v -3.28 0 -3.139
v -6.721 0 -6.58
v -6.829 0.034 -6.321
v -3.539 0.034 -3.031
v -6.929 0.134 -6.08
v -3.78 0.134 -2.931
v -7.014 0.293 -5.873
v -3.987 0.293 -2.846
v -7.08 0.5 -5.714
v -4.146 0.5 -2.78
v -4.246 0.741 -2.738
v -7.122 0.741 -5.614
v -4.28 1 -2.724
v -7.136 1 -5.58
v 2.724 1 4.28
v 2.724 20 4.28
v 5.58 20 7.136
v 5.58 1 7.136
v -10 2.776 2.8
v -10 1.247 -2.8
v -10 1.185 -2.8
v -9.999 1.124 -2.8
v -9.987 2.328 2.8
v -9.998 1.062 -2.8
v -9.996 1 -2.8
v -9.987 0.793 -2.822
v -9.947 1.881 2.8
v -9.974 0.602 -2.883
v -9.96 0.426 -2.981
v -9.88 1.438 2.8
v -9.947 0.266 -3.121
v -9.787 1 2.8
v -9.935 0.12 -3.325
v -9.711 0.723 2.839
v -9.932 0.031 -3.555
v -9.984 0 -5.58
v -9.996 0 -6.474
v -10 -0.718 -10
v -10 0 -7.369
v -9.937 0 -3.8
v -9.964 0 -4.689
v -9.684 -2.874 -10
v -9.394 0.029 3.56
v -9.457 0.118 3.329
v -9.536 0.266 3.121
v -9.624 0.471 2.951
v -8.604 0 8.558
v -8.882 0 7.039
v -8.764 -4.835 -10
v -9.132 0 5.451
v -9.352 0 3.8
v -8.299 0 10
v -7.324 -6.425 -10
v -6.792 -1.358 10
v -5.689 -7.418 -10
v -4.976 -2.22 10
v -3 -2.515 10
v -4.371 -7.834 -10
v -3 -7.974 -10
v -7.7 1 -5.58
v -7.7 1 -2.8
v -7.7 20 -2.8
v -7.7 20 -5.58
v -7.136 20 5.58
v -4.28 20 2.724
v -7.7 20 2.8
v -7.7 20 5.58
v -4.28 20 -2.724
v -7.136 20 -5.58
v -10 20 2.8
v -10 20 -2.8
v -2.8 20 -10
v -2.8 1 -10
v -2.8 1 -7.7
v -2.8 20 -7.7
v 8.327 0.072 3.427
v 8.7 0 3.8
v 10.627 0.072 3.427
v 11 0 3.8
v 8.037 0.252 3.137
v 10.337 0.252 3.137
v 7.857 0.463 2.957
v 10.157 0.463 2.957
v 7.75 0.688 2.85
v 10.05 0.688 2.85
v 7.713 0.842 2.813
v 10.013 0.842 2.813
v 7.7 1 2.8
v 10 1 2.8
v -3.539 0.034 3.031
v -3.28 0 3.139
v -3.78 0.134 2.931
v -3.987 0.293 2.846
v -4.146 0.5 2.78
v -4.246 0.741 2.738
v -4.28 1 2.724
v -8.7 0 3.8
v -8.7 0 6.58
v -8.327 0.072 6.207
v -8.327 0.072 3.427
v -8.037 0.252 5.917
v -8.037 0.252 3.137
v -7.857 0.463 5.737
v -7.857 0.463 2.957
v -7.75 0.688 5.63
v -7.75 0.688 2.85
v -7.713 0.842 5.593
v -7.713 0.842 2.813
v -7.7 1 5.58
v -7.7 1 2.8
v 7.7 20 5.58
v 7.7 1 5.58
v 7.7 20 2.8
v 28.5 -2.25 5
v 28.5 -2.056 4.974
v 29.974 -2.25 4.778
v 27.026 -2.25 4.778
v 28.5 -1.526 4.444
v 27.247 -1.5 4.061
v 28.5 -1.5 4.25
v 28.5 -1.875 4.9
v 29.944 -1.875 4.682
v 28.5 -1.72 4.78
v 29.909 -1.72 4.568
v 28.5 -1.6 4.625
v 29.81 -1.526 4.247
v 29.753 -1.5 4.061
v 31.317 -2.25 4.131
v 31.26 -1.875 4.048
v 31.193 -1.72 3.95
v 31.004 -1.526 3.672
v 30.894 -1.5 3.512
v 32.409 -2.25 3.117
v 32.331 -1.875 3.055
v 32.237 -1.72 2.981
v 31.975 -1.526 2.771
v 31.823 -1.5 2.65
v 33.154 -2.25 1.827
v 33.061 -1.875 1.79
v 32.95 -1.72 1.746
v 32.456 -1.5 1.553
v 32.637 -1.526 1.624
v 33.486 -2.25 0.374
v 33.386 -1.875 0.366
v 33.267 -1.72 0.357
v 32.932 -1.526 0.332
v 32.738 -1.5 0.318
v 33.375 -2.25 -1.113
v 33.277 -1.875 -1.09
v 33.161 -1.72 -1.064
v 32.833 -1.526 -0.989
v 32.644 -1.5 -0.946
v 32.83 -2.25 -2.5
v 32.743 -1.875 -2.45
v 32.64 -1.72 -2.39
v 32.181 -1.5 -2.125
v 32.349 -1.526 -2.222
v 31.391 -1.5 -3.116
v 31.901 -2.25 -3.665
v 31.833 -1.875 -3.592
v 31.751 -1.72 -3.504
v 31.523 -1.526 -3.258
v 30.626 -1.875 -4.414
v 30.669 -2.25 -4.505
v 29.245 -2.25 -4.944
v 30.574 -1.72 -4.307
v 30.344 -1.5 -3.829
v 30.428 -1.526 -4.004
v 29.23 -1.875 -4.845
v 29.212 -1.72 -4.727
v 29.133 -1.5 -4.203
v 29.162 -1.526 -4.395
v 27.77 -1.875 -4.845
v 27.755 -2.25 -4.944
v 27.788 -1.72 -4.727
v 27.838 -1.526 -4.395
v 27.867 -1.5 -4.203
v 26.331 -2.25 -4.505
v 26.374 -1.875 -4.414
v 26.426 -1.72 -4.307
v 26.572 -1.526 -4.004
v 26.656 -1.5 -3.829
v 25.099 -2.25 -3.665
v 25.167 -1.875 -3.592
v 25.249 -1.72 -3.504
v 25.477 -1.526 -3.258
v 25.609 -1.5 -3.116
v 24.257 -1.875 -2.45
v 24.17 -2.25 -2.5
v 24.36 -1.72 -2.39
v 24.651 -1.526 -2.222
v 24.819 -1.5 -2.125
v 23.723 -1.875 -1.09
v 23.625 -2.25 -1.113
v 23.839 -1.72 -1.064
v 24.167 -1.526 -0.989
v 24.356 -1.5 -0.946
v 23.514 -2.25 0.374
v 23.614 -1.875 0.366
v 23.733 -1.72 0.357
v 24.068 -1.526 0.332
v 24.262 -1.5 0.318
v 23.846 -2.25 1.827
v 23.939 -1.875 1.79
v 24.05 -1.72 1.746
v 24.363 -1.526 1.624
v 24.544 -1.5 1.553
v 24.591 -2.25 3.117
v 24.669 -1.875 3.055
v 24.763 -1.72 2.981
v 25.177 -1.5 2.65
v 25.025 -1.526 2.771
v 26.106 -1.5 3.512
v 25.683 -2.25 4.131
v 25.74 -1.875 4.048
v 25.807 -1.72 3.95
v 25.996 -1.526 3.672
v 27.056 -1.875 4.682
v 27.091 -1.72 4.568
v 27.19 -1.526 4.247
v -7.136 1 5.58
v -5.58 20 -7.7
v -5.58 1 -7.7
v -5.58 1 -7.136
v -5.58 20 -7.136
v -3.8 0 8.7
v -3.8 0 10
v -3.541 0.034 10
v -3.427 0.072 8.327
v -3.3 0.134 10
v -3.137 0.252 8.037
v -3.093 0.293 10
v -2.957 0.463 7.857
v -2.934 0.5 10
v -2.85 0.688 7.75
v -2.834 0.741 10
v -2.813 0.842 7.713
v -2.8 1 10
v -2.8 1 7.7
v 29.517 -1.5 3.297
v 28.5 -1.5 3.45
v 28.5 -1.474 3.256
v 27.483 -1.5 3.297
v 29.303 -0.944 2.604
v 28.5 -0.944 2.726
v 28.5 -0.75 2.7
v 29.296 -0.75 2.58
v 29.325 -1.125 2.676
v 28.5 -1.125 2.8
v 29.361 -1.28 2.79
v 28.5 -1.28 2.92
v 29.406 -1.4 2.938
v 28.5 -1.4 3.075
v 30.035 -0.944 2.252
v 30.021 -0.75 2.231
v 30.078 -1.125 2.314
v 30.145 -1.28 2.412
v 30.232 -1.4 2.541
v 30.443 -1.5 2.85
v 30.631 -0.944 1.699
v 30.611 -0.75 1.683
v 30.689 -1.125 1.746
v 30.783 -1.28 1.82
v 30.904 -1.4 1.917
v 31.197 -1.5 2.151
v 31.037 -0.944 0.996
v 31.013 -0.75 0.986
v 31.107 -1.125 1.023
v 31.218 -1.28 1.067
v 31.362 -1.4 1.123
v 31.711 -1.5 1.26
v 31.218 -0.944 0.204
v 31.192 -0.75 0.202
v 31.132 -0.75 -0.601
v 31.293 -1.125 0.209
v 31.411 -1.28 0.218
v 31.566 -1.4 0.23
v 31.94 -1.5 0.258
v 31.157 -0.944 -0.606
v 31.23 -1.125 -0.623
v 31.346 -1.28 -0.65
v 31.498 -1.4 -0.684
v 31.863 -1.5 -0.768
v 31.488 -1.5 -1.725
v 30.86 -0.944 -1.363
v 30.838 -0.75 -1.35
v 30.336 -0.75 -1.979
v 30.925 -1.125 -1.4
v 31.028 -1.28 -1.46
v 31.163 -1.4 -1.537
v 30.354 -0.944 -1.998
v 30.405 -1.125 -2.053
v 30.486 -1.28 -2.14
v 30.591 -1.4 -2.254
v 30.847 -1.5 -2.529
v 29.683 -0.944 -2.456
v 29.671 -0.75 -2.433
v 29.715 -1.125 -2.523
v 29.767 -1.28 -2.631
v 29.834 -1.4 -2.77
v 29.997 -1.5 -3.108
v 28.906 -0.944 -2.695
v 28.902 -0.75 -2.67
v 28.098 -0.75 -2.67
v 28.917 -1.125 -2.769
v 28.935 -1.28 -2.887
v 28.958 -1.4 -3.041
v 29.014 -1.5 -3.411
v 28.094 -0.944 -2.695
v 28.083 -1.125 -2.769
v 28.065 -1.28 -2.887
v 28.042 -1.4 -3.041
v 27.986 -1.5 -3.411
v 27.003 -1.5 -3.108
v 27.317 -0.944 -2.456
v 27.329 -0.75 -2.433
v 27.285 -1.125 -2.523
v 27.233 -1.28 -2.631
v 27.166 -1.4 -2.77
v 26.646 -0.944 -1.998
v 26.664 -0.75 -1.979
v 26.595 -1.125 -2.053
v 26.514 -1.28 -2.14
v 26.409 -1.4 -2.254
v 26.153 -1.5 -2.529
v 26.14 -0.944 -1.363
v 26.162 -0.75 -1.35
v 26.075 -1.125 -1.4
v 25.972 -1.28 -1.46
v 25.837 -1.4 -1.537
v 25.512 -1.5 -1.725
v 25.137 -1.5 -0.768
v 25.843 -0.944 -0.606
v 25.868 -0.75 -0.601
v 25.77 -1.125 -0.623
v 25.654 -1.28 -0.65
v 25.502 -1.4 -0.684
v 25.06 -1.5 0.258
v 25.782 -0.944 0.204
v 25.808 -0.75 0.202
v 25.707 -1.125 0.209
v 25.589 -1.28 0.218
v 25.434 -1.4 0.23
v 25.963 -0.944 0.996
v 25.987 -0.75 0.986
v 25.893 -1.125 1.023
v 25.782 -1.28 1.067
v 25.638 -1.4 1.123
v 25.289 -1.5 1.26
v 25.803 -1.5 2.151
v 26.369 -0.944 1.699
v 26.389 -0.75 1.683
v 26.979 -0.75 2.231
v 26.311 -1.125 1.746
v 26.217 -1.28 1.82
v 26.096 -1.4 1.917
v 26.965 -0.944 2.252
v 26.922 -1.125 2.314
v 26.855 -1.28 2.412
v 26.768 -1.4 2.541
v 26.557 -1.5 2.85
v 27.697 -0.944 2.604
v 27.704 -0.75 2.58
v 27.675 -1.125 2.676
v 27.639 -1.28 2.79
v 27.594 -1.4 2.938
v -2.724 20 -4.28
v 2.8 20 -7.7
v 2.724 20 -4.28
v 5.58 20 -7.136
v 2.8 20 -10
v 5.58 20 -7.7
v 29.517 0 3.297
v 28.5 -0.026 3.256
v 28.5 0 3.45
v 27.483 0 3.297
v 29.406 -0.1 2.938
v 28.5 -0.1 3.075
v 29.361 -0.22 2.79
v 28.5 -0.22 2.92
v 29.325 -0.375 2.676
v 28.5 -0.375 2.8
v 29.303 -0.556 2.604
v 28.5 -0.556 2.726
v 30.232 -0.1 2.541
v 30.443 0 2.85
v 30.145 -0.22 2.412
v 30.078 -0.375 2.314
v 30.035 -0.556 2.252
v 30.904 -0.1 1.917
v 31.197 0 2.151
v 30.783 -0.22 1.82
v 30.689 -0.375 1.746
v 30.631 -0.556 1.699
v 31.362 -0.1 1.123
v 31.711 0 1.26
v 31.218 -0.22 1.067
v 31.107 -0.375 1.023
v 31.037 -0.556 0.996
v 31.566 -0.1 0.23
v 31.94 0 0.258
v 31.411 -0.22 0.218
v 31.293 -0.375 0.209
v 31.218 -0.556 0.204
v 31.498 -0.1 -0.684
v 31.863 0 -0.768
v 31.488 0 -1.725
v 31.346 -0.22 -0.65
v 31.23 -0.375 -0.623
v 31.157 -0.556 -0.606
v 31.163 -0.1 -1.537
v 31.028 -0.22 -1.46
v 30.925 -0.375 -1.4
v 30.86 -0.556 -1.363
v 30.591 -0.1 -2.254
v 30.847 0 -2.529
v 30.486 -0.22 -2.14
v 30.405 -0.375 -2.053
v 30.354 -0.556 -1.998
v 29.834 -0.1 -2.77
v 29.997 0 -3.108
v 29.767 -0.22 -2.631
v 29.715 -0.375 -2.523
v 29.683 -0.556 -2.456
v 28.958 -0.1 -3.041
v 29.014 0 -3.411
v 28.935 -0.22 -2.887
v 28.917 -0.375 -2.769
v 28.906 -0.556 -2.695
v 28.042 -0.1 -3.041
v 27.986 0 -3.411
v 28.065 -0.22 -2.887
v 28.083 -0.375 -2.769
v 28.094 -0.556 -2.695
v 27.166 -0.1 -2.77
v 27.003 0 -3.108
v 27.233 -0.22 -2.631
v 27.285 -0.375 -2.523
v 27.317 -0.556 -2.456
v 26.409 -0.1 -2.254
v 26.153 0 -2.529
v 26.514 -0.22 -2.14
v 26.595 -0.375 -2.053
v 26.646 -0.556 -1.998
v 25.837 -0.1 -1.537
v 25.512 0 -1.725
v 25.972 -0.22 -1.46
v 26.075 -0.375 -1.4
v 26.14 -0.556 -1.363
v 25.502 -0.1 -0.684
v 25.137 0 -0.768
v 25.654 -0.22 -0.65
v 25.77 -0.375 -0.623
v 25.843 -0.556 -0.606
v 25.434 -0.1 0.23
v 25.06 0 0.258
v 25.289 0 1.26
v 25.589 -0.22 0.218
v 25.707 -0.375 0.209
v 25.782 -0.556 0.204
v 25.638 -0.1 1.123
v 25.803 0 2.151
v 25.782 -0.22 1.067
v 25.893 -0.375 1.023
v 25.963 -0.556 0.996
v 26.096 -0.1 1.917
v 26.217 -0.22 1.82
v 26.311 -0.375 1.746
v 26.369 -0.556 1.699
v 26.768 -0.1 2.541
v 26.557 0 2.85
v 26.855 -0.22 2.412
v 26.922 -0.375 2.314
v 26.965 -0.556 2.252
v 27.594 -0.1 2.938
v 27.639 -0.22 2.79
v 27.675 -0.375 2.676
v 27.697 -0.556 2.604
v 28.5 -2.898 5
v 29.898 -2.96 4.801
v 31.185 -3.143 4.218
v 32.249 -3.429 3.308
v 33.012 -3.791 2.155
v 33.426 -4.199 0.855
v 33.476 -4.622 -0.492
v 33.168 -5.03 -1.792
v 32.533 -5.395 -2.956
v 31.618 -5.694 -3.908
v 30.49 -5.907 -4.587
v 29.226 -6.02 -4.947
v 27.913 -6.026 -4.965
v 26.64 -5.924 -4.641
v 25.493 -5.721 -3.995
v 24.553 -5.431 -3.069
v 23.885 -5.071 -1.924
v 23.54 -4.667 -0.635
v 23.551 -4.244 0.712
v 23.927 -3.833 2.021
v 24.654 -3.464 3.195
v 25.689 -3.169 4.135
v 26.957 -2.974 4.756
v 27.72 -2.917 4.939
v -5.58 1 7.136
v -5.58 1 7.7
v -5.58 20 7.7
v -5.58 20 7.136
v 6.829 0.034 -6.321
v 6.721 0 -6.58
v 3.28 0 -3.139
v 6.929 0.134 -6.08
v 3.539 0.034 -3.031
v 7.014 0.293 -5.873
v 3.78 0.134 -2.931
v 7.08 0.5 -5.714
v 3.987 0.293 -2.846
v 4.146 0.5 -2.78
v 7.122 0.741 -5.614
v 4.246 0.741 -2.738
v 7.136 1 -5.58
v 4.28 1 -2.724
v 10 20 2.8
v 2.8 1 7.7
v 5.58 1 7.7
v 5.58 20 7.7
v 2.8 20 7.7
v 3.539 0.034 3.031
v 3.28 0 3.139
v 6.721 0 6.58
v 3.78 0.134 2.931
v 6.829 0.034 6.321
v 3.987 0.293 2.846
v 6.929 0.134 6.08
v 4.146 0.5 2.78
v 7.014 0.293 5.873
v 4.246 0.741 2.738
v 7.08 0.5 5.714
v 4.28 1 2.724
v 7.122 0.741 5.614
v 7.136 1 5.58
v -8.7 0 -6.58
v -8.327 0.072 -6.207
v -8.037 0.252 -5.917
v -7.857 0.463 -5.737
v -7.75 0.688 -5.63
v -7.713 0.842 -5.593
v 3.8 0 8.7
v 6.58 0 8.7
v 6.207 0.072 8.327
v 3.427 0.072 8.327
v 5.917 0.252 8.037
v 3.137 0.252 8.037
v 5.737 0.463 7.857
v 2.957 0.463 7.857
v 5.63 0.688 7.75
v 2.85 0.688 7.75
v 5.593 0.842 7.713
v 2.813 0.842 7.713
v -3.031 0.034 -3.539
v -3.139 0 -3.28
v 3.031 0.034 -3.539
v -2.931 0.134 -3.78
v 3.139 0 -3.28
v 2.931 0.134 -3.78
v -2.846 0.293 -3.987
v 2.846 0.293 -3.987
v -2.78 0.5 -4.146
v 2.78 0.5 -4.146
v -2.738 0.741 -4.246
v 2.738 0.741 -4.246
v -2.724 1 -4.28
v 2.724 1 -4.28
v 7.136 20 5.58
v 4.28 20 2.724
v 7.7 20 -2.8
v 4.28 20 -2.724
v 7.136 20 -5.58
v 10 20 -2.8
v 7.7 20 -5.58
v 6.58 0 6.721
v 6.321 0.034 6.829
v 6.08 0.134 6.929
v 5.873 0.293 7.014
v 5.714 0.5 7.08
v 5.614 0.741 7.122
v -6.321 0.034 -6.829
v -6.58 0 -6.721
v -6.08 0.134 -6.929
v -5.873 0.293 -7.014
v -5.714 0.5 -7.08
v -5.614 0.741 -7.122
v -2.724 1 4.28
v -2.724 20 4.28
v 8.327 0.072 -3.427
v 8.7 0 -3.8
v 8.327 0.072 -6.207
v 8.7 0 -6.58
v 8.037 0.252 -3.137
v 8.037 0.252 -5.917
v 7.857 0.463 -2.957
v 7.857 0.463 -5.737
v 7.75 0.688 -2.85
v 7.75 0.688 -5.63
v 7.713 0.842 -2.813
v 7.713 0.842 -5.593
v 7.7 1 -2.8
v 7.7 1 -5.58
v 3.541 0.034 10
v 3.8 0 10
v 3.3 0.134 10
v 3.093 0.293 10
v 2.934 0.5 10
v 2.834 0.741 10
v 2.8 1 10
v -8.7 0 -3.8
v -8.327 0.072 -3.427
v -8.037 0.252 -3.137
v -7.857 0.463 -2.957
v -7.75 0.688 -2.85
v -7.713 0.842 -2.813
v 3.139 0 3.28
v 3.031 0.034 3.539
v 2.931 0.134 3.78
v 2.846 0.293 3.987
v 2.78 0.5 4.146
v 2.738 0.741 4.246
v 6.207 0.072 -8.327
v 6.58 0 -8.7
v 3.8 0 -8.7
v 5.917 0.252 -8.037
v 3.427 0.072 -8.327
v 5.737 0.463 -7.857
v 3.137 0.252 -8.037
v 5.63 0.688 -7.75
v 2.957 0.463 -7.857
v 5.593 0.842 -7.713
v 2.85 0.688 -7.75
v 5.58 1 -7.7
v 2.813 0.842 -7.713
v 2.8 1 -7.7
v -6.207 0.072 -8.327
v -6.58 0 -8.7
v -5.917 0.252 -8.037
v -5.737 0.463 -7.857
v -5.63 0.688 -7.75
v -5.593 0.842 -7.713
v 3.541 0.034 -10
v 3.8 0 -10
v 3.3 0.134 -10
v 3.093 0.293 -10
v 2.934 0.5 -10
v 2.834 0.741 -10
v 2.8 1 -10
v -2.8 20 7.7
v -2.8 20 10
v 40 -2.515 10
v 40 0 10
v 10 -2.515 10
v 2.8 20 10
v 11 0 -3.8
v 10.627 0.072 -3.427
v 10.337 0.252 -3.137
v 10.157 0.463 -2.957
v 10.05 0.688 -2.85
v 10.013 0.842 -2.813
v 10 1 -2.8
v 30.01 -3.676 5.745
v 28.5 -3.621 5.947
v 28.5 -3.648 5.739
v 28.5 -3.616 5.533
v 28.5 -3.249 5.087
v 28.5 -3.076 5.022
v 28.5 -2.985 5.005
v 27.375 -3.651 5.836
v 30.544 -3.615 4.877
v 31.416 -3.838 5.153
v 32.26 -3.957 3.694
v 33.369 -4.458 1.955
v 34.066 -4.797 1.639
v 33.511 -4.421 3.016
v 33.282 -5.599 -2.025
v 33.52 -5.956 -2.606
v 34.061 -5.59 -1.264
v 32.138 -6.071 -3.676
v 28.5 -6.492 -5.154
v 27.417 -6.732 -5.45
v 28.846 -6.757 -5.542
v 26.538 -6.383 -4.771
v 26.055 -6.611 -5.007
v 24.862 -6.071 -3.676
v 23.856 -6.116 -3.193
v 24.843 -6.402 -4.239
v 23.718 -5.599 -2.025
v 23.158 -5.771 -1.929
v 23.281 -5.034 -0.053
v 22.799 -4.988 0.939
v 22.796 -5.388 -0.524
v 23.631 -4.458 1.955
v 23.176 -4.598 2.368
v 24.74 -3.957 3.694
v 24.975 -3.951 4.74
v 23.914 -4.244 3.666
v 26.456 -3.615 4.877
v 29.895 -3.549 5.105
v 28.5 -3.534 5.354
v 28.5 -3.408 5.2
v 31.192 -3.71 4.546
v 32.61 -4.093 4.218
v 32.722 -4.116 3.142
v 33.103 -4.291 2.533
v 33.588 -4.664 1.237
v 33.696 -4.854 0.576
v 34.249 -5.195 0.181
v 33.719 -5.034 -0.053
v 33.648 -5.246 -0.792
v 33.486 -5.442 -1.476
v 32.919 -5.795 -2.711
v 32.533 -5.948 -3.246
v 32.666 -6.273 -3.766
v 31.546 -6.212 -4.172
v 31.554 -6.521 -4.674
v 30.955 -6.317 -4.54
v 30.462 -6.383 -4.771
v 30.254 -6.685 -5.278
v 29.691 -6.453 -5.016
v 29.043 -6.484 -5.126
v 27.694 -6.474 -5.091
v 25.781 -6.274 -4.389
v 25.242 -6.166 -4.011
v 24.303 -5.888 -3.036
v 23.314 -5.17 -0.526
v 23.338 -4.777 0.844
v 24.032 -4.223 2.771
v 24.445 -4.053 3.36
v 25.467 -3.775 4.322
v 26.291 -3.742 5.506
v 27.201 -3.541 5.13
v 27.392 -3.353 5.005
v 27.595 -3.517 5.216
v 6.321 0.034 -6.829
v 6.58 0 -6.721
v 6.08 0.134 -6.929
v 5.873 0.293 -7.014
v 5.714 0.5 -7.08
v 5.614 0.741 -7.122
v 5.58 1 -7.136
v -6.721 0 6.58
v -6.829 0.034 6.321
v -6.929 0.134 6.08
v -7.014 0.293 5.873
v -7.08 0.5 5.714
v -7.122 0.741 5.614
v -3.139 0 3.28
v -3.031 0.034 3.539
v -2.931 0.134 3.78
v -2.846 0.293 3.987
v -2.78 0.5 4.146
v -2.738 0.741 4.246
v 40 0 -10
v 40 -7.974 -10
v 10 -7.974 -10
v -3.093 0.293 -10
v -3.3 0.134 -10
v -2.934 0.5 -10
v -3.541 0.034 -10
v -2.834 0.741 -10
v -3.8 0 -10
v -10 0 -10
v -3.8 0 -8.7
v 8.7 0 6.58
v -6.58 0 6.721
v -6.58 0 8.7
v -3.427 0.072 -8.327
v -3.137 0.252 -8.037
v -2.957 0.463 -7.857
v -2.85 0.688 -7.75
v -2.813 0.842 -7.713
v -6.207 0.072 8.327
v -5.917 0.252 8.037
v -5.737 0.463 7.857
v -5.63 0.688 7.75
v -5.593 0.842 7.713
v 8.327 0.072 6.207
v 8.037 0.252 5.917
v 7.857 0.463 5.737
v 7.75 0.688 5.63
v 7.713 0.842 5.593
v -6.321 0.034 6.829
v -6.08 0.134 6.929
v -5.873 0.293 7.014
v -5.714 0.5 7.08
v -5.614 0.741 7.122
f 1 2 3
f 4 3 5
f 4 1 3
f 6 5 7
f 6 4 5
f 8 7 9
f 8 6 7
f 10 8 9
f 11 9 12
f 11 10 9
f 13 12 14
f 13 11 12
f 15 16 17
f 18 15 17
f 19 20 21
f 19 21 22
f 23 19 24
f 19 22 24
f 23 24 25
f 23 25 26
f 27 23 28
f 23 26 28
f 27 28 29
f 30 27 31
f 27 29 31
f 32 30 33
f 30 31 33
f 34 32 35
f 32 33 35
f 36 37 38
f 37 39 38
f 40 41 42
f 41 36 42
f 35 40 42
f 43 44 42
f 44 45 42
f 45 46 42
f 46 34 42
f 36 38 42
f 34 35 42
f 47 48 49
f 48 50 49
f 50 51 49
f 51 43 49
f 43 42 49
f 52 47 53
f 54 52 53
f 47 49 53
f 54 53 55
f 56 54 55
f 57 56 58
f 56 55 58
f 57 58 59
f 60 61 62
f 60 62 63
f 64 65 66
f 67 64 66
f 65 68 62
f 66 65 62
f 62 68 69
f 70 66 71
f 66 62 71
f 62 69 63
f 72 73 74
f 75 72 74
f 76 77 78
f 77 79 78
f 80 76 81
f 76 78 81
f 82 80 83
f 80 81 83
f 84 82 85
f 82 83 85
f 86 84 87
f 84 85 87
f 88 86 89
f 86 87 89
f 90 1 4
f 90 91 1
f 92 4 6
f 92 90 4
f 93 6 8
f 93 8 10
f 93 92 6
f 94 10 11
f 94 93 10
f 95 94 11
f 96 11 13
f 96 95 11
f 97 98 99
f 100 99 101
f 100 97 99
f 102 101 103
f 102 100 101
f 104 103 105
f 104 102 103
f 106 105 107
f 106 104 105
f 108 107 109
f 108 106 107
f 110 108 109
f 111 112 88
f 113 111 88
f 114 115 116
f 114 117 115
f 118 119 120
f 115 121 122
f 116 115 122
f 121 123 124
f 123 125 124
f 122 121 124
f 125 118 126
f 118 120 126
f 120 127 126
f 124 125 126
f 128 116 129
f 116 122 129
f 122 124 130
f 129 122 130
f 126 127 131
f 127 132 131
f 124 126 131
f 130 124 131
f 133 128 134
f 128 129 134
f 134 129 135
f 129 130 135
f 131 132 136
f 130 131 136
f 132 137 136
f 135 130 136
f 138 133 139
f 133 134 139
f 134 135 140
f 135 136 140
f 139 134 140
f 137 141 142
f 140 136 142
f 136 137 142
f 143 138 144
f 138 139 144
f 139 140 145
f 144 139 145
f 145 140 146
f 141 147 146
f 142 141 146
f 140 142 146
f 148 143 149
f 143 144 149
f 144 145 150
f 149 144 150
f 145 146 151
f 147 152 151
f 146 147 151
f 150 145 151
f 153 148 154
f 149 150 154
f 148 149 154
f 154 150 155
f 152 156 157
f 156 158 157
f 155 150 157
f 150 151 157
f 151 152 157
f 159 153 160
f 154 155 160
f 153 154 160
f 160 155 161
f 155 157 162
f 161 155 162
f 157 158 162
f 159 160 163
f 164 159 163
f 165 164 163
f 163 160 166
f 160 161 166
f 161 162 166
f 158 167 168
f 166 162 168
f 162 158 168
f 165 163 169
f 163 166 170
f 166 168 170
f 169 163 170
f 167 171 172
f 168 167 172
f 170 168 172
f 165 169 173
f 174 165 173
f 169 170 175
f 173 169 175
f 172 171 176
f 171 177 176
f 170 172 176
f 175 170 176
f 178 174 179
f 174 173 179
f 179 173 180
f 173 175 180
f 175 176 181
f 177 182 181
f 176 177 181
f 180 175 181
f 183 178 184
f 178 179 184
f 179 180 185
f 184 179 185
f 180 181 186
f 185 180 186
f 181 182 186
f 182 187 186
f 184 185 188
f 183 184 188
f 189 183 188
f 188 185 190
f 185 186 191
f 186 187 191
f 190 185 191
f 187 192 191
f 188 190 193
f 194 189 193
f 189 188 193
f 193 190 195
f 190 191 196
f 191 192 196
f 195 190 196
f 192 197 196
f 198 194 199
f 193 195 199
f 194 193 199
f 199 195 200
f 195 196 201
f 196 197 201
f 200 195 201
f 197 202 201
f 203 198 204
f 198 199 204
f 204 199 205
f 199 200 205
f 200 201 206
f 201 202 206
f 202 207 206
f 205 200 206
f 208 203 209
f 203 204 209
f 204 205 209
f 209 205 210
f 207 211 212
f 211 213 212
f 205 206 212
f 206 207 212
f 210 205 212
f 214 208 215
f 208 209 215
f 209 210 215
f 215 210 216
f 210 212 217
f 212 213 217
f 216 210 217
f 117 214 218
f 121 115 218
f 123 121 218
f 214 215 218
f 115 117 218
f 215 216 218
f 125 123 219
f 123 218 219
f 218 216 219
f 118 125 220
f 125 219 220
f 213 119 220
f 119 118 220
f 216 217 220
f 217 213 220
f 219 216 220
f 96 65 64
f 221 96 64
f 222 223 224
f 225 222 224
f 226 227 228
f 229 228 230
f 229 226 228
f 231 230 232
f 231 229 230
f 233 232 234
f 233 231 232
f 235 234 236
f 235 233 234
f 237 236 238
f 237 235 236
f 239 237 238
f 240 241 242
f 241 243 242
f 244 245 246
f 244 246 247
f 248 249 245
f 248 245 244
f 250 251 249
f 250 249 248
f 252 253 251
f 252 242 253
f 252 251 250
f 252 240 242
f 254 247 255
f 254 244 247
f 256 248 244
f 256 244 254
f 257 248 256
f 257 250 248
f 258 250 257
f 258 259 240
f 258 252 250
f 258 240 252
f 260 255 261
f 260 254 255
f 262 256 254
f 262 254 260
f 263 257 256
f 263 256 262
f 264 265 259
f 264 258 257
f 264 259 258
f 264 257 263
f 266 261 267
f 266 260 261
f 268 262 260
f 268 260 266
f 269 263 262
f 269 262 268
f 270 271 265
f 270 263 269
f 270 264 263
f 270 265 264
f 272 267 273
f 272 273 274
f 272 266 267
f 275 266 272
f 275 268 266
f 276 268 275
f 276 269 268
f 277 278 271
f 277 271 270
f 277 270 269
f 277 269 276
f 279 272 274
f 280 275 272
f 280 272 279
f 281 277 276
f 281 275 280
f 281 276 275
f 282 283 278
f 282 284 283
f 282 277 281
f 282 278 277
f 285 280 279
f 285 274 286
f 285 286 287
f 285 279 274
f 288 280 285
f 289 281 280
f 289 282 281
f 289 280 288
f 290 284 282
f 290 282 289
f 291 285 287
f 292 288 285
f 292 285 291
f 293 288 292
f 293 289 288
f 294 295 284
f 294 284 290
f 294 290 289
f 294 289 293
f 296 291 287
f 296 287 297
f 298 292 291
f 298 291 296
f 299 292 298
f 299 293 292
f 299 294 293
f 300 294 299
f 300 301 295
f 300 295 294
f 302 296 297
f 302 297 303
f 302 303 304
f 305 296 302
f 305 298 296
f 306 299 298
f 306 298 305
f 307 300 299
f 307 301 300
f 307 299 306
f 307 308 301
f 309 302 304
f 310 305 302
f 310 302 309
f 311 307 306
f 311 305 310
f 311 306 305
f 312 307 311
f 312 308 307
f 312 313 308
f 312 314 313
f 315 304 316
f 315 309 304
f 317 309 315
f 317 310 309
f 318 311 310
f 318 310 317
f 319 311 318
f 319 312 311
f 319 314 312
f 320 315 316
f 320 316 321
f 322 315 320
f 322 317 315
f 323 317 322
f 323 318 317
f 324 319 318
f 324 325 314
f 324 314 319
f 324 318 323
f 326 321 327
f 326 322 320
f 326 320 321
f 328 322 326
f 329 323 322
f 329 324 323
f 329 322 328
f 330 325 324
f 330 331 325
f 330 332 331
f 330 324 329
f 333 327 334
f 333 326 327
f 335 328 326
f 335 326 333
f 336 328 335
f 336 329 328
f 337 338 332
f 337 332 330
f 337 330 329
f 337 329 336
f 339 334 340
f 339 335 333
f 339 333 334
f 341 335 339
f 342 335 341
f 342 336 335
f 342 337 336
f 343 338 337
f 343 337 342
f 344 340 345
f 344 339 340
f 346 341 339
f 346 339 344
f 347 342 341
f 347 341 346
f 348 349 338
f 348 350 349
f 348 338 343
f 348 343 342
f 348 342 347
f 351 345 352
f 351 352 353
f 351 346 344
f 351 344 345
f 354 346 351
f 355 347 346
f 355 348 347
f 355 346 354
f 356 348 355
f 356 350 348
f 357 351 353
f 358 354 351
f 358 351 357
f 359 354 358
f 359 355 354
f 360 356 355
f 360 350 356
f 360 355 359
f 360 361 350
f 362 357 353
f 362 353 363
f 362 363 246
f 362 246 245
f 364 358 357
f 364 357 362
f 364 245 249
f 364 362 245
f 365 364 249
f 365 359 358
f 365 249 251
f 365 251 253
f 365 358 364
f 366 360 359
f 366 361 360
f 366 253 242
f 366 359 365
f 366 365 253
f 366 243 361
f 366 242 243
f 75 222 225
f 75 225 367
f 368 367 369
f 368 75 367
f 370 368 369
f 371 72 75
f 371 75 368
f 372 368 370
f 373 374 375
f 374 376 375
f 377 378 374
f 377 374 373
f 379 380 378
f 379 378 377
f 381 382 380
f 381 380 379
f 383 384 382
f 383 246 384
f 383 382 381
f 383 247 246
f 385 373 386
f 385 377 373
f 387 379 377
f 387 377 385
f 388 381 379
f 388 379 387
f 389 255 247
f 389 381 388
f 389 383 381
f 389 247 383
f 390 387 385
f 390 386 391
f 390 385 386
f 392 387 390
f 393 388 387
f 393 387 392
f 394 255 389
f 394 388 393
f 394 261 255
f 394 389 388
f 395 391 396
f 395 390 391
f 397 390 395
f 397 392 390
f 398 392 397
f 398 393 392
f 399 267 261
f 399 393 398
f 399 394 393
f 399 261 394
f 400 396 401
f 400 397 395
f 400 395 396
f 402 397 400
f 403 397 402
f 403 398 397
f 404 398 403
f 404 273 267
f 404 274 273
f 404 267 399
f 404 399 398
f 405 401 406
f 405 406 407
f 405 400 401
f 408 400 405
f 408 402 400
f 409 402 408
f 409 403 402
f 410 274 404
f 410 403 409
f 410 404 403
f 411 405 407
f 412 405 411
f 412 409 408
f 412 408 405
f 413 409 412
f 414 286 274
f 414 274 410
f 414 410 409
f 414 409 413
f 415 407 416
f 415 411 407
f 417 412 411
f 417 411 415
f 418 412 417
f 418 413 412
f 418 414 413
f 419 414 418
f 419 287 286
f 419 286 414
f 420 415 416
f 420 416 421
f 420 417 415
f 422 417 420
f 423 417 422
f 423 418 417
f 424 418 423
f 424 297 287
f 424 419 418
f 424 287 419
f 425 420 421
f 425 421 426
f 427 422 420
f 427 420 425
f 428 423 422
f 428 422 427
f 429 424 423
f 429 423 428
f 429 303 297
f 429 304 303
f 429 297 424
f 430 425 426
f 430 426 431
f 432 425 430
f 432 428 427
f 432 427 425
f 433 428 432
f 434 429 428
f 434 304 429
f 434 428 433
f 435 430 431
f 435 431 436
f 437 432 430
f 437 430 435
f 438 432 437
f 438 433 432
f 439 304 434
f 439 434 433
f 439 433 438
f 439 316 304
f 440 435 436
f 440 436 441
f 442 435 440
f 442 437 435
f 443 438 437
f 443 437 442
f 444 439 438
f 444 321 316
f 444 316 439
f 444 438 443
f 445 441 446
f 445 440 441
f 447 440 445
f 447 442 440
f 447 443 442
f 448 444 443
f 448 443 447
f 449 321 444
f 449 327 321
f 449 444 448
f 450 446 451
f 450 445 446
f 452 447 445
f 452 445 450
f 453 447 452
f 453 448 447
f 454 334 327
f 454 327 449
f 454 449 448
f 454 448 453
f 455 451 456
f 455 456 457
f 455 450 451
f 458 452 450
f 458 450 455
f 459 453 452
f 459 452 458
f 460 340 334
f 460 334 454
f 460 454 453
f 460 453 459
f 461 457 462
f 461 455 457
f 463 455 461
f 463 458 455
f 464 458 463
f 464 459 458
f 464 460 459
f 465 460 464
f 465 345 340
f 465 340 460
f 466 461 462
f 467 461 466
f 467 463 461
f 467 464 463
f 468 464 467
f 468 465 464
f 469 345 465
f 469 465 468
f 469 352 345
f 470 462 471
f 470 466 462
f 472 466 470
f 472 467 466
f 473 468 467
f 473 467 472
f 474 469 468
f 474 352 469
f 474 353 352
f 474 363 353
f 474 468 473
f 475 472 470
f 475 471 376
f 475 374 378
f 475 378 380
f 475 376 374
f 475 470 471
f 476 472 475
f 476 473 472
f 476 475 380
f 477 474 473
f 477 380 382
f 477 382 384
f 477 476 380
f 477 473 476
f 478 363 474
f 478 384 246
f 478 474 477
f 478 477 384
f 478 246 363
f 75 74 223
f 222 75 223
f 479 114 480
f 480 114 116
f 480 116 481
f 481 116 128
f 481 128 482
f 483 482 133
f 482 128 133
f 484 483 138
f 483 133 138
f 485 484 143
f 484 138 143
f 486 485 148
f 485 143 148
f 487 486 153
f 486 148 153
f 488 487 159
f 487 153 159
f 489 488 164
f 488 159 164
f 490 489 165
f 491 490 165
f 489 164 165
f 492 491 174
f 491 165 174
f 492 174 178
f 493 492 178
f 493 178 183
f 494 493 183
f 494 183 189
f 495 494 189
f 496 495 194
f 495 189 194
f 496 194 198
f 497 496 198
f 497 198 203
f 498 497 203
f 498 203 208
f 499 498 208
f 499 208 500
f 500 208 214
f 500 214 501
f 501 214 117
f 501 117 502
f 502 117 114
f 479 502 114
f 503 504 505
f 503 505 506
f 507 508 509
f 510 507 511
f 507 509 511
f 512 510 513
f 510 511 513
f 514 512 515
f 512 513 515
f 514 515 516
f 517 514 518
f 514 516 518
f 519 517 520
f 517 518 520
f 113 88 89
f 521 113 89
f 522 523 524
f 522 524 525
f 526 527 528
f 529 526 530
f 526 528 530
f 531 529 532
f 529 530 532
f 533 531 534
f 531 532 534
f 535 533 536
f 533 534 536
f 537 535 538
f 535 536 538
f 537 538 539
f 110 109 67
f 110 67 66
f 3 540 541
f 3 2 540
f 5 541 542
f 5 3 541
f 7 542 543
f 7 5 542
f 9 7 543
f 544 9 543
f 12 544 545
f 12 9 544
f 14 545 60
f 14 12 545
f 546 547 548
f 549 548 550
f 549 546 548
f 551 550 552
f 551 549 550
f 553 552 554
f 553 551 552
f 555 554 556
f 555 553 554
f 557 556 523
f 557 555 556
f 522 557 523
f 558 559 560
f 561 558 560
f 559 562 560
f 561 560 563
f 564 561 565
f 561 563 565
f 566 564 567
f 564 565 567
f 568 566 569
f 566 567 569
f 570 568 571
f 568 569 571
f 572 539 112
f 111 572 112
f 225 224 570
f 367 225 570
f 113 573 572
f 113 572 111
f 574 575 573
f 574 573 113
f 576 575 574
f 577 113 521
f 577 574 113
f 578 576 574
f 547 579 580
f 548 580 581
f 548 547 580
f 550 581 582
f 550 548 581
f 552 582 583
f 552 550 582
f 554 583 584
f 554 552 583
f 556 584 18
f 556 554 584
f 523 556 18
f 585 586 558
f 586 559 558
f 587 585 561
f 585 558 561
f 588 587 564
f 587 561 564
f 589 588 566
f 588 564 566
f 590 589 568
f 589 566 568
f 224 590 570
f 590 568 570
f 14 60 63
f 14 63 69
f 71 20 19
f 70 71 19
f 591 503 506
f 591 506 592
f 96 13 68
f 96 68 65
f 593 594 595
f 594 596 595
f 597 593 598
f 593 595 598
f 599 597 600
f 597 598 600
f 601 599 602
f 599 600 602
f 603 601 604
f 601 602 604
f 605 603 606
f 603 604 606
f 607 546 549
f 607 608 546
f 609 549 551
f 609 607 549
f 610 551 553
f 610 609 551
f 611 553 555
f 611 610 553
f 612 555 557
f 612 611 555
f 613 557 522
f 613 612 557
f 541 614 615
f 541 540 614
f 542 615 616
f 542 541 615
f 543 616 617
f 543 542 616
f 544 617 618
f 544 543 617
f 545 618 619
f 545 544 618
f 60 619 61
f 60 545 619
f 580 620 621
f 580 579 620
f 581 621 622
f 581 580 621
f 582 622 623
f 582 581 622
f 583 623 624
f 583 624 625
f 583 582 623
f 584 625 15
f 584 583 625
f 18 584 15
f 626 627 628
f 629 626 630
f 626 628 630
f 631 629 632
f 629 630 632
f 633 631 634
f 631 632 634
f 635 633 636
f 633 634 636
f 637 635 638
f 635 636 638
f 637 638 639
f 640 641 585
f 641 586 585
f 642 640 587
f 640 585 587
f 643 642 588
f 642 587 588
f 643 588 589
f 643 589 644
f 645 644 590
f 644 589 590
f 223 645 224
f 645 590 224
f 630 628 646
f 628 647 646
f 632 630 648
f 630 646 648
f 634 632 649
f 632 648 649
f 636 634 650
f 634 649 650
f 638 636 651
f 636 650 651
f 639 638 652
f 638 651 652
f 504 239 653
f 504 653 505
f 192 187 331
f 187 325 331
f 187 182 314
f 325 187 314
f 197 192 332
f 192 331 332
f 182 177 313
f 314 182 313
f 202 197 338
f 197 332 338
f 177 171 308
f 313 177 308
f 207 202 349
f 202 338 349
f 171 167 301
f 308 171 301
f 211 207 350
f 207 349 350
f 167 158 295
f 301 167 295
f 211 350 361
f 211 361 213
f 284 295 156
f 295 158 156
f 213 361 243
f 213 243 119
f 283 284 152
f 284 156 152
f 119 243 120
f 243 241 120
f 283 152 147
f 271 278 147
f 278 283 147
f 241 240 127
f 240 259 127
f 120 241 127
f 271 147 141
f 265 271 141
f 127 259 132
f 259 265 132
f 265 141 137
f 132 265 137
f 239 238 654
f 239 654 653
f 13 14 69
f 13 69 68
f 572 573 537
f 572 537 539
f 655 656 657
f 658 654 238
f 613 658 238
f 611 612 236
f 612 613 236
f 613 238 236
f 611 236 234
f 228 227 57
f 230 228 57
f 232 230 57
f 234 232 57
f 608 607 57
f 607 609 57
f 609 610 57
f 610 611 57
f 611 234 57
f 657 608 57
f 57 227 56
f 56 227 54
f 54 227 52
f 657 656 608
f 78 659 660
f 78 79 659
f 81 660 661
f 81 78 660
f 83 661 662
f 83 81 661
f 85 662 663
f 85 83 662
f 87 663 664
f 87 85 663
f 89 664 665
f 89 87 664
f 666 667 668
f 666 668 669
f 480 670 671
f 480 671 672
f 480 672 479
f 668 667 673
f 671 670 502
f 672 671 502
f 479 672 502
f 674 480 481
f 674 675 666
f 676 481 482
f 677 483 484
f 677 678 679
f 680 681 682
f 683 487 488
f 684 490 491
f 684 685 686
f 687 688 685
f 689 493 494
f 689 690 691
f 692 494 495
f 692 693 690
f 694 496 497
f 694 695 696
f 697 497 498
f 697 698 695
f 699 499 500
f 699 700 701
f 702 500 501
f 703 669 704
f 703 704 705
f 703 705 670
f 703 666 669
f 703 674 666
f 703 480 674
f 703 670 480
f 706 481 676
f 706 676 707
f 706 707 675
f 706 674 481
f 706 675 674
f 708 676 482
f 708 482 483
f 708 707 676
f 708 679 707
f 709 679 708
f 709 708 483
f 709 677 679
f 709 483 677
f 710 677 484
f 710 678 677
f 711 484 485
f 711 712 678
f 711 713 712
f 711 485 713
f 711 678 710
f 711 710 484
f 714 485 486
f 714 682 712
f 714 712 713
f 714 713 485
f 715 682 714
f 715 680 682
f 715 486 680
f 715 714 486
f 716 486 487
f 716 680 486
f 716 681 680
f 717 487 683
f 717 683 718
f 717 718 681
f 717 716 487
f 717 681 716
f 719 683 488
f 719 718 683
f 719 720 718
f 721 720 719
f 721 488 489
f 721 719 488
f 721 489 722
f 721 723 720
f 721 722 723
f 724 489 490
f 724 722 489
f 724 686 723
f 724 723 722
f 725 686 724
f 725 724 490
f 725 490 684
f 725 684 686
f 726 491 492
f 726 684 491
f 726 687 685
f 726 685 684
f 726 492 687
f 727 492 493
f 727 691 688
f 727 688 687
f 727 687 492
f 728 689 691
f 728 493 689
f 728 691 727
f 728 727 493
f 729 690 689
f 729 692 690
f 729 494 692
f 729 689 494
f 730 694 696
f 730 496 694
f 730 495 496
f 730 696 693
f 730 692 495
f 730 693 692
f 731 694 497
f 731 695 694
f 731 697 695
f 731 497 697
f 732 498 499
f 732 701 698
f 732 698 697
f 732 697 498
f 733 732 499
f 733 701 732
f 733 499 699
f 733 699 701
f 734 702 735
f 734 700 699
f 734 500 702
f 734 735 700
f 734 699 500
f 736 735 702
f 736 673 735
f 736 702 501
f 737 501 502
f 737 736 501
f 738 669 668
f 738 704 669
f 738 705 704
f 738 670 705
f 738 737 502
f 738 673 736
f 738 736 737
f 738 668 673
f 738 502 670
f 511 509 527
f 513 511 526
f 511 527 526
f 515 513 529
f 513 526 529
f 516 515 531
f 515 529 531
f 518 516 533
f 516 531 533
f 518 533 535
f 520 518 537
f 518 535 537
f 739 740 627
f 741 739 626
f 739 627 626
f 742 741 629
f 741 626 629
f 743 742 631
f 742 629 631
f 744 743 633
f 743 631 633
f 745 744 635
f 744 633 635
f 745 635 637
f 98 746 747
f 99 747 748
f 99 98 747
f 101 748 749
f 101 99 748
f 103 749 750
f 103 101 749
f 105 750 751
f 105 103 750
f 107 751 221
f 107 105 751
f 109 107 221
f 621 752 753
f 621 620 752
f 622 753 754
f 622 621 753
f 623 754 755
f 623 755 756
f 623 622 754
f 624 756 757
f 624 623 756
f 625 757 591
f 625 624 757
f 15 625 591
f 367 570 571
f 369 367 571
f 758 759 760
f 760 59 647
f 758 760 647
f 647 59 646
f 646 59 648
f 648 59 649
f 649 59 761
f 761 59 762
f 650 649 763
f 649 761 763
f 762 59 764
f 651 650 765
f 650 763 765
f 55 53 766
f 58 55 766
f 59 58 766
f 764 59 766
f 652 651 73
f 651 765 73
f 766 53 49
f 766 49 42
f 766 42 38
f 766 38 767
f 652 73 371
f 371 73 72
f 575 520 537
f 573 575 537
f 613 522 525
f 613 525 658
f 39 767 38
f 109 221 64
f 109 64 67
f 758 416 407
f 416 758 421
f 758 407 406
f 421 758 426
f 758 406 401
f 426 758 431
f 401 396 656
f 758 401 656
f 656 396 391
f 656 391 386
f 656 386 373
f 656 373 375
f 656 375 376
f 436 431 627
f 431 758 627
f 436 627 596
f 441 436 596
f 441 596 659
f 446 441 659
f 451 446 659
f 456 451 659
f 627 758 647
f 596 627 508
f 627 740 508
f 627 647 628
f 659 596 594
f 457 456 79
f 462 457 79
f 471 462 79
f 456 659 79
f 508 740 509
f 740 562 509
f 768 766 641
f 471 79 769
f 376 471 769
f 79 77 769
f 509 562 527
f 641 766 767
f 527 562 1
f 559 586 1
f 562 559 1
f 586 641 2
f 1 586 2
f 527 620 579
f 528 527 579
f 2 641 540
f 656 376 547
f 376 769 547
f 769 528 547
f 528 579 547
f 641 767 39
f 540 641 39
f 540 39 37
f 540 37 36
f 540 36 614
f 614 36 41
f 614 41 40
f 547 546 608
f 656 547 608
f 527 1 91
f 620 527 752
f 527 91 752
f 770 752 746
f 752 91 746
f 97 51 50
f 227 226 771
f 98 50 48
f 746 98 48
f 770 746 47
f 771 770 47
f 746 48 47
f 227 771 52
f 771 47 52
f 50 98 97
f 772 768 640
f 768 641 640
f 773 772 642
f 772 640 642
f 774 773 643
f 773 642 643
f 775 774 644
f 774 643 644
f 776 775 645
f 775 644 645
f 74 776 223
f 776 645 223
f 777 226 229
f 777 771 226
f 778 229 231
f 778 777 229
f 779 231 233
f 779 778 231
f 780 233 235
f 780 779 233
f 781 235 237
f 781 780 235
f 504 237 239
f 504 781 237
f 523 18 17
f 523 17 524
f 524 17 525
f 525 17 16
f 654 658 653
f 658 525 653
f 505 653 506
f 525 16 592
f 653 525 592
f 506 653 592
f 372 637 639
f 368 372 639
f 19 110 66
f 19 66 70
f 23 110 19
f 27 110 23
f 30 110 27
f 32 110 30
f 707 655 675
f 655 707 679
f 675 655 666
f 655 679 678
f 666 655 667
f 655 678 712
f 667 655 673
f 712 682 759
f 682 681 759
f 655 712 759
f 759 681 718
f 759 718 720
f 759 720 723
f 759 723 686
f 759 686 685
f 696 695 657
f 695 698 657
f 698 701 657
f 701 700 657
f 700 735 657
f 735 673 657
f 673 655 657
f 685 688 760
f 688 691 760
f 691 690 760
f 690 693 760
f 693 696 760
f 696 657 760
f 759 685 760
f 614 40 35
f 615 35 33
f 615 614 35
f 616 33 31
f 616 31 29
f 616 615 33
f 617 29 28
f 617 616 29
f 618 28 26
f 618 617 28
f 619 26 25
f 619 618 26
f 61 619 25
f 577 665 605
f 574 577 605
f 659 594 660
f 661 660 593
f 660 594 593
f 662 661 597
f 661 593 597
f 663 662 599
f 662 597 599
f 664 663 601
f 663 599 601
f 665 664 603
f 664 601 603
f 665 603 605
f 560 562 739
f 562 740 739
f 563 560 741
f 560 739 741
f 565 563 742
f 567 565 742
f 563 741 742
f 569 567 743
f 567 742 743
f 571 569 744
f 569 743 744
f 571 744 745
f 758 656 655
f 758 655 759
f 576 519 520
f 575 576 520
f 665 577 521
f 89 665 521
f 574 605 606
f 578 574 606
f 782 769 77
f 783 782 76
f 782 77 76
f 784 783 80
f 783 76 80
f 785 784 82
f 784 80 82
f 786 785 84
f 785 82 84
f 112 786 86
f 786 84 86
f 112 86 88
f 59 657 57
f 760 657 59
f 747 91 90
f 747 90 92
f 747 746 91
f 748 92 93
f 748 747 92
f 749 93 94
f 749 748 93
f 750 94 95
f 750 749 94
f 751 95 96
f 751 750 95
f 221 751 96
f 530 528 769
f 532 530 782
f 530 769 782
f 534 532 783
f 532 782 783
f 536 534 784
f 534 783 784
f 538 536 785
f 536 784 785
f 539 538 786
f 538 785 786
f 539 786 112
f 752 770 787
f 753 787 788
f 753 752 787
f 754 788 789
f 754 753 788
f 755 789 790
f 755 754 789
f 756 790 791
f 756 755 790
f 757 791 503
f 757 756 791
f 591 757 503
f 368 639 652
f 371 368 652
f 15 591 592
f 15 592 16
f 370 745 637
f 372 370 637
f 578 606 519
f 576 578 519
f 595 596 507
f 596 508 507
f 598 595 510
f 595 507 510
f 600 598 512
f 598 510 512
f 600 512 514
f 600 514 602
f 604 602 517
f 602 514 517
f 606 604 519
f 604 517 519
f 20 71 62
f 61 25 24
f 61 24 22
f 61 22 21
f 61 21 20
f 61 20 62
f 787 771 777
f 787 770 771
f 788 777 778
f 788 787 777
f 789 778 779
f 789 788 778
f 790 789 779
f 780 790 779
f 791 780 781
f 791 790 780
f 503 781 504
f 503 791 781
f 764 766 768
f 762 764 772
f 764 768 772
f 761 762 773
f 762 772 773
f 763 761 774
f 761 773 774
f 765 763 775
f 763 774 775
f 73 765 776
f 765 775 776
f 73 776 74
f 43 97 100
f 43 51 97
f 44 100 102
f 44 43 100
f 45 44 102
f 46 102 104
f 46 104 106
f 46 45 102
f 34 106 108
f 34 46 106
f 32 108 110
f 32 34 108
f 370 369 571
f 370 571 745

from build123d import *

# Parameters (mm, degrees)
BOSS_EXTRUDE1_DEPTH   = 20
BOSS_EXTRUDE1_2_DEPTH = 20
BOSS_EXTRUDE1_3_DEPTH = 20
BOSS_EXTRUDE1_4_DEPTH = 20
SKETCH2_W             = 20
SKETCH2_H             = 20
BOSS_EXTRUDE2_DEPTH   = 20
CUT_EXTRUDE1_DEPTH    = 31
BOSS_EXTRUDE3_DEPTH   = 30
SKETCH5_R             = 2.7
CUT_EXTRUDE2_DEPTH    = 30
SKETCH6_R             = 5
CUT_EXTRUDE3_DEPTH    = 30
FILLET1_R             = 7
FILLET3_R             = 1
FILLET4_R             = 0.75


# Some blends are built 0.0001 mm under size
with BuildPart() as part:
    # Sketch1 → Boss-Extrude1 (new body)
    with BuildSketch(Plane(origin=(0, 0, 0), x_dir=(1, 0, 0), z_dir=(0, 1, 0))):
        Polygon((-10, -2.8), (-10, 2.8), (-7.7, 2.8), (-7.7, 5.58), (-7.135634919, 5.58), (-4.28, 2.724365081), (-4.28, -2.724365081), (-7.135634919, -5.58), (-7.7, -5.58), (-7.7, -2.8), align=None)
    extrude(amount=BOSS_EXTRUDE1_DEPTH)



with BuildPart() as body_2:
    # Sketch1 → Boss-Extrude1 2 (new body)
    with BuildSketch(Plane(origin=(0, 0, 0), x_dir=(1, 0, 0), z_dir=(0, 1, 0))):
        Polygon((10, 2.8), (7.7, 2.8), (7.7, 5.58), (7.135634919, 5.58), (4.28, 2.724365081), (4.28, -2.724365081), (7.135634919, -5.58), (7.7, -5.58), (7.7, -2.8), (10, -2.8), align=None)
    extrude(amount=BOSS_EXTRUDE1_2_DEPTH)


with BuildPart() as body_3:
    # Sketch1 → Boss-Extrude1 3 (new body)
    with BuildSketch(Plane(origin=(0, 0, 0), x_dir=(1, 0, 0), z_dir=(0, 1, 0))):
        Polygon((2.8, -10), (-2.8, -10), (-2.8, -7.7), (-5.58, -7.7), (-5.58, -7.135634919), (-2.724365081, -4.28), (2.724365081, -4.28), (5.58, -7.135634919), (5.58, -7.7), (2.8, -7.7), align=None)
    extrude(amount=BOSS_EXTRUDE1_3_DEPTH)


with BuildPart() as body_4:
    # Sketch1 → Boss-Extrude1 4 (new body)
    with BuildSketch(Plane(origin=(0, 0, 0), x_dir=(1, 0, 0), z_dir=(0, 1, 0))):
        Polygon((-2.8, 10), (-2.8, 7.7), (-5.58, 7.7), (-5.58, 7.135634919), (-2.724365081, 4.28), (2.724365081, 4.28), (5.58, 7.135634919), (5.58, 7.7), (2.8, 7.7), (2.8, 10), align=None)
    extrude(amount=BOSS_EXTRUDE1_4_DEPTH)


with BuildPart() as part_1:
    add(part.part)

    add(body_2.part)  # Boss-Extrude2 merges body 2

    add(body_3.part)  # Boss-Extrude2 merges body 3

    add(body_4.part)  # Boss-Extrude2 merges body 4
    # Sketch2 → Boss-Extrude2 (add)
    with BuildSketch(Plane.XZ):
        Rectangle(SKETCH2_W, SKETCH2_H)
    extrude(amount=BOSS_EXTRUDE2_DEPTH)

    # Sketch3 → Cut-Extrude1 (cut, through all)
    with BuildSketch(Plane(origin=(10, 0, 0), x_dir=(0, 0, -1), z_dir=(1, 0, 0))):
        Polygon((10.596673941, -8.137212268), (10.596673941, -38.345549702), (-10.411138478, -38.345549702), (-10.411138478, -2.402671747), align=None)
    extrude(amount=-CUT_EXTRUDE1_DEPTH, mode=Mode.SUBTRACT)

    # Sketch4 → Boss-Extrude3 (add)
    with BuildSketch(Plane(origin=(10, 0, 0), x_dir=(0, 0, -1), z_dir=(1, 0, 0))):
        Polygon((10, -7.974337104), (10, 0), (-10, 0), (-10, -2.51490096), align=None)
    extrude(amount=BOSS_EXTRUDE3_DEPTH)

    # Sketch5 → Cut-Extrude2 (cut)
    with BuildSketch(Plane(origin=(0, 0, 0), x_dir=(1, 0, 0), z_dir=(0, 1, 0))):
        with Locations(Location((28.5, 0, 0), (0, 0, 270))):
            Circle(SKETCH5_R)
    extrude(amount=-CUT_EXTRUDE2_DEPTH, mode=Mode.SUBTRACT)

    # Sketch6 → Cut-Extrude3 (cut)
    with BuildSketch(Plane(origin=(0, -1.5, 0), x_dir=(1, 0, 0), z_dir=(0, 1, 0))):
        with Locations(Location((28.5, 0, 0), (0, 0, 270))):
            Circle(SKETCH6_R)
    extrude(amount=-CUT_EXTRUDE3_DEPTH, mode=Mode.SUBTRACT)

    # Fillet1
    # the kernel refuses this fillet: 7 mm, written as the material it takes off along each edge
    with BuildSketch(Plane(origin=(-10, -12.582734088, -26.882318479), x_dir=(0, 0.9647039130954433, -0.26333697054978655), z_dir=(0, 0.26333697054978655, 0.9647039130954435))) as fillet1_piece_1:
        with BuildLine():
            CenterArc((FILLET1_R, -FILLET1_R), FILLET1_R, 90, 90)
            Line((0, -FILLET1_R), (0, 0))
            Line((0, 0), (FILLET1_R, 0))
        make_face()
    extrude(amount=55.731749637, mode=Mode.SUBTRACT)

    # Fillet3
    fillet3_edges = [part_1.edges().sort_by_distance(p)[0] for p in [
        (4.152182541, 0, -5.707817459),
        (5.58, 0, -7.417817459),
        (4.19, 0, -7.7),
        (2.8, 0, -8.85),
        (-2.8, 0, -8.85),
        (-4.19, 0, -7.7),
        (-5.58, 0, -7.417817459),
        (-4.152182541, 0, -5.707817459),
        (0, 0, -4.28),
        (4.28, 0, 0),
        (5.707817459, 0, -4.152182541),
        (7.417817459, 0, -5.58),
        (7.7, 0, -4.19),
        (8.85, 0, -2.8),
        (10, 0, 0),
        (8.85, 0, 2.8),
        (7.7, 0, 4.19),
        (5.707817459, 0, 4.152182541),
        (7.417817459, 0, 5.58),
        (2.8, 0, 8.85),
        (4.19, 0, 7.7),
        (5.58, 0, 7.417817459),
        (4.152182541, 0, 5.707817459),
        (0, 0, 4.28),
        (-4.152182541, 0, 5.707817459),
        (-5.58, 0, 7.417817459),
        (-2.8, 0, 8.85),
        (-4.19, 0, 7.7),
        (-8.583774042, 0, 2.8),
        (-7.7, 0, 4.19),
        (-7.417817459, 0, 5.58),
        (-5.707817459, 0, 4.152182541),
        (-4.28, 0, 0),
        (-5.707817459, 0, -4.152182541),
        (-7.417817459, 0, -5.58),
        (-7.7, 0, -4.19),
        (-8.79791333, 0, -2.8),
    ]]
    fillet(fillet3_edges, radius=FILLET3_R)

    # Fillet4
    fillet4_edges = [part_1.edges().sort_by_distance(p)[0] for p in [
        (28.5, 0, -2.7),
        (28.5, -6.609478068, -5),
        (28.5, -1.5, -5),
        (28.5, -1.5, -2.7),
    ]]
    fillet(fillet4_edges, radius=FILLET4_R - 0.0001)  # a hair under: the kernel refuses the full size


solid = part_1.part
